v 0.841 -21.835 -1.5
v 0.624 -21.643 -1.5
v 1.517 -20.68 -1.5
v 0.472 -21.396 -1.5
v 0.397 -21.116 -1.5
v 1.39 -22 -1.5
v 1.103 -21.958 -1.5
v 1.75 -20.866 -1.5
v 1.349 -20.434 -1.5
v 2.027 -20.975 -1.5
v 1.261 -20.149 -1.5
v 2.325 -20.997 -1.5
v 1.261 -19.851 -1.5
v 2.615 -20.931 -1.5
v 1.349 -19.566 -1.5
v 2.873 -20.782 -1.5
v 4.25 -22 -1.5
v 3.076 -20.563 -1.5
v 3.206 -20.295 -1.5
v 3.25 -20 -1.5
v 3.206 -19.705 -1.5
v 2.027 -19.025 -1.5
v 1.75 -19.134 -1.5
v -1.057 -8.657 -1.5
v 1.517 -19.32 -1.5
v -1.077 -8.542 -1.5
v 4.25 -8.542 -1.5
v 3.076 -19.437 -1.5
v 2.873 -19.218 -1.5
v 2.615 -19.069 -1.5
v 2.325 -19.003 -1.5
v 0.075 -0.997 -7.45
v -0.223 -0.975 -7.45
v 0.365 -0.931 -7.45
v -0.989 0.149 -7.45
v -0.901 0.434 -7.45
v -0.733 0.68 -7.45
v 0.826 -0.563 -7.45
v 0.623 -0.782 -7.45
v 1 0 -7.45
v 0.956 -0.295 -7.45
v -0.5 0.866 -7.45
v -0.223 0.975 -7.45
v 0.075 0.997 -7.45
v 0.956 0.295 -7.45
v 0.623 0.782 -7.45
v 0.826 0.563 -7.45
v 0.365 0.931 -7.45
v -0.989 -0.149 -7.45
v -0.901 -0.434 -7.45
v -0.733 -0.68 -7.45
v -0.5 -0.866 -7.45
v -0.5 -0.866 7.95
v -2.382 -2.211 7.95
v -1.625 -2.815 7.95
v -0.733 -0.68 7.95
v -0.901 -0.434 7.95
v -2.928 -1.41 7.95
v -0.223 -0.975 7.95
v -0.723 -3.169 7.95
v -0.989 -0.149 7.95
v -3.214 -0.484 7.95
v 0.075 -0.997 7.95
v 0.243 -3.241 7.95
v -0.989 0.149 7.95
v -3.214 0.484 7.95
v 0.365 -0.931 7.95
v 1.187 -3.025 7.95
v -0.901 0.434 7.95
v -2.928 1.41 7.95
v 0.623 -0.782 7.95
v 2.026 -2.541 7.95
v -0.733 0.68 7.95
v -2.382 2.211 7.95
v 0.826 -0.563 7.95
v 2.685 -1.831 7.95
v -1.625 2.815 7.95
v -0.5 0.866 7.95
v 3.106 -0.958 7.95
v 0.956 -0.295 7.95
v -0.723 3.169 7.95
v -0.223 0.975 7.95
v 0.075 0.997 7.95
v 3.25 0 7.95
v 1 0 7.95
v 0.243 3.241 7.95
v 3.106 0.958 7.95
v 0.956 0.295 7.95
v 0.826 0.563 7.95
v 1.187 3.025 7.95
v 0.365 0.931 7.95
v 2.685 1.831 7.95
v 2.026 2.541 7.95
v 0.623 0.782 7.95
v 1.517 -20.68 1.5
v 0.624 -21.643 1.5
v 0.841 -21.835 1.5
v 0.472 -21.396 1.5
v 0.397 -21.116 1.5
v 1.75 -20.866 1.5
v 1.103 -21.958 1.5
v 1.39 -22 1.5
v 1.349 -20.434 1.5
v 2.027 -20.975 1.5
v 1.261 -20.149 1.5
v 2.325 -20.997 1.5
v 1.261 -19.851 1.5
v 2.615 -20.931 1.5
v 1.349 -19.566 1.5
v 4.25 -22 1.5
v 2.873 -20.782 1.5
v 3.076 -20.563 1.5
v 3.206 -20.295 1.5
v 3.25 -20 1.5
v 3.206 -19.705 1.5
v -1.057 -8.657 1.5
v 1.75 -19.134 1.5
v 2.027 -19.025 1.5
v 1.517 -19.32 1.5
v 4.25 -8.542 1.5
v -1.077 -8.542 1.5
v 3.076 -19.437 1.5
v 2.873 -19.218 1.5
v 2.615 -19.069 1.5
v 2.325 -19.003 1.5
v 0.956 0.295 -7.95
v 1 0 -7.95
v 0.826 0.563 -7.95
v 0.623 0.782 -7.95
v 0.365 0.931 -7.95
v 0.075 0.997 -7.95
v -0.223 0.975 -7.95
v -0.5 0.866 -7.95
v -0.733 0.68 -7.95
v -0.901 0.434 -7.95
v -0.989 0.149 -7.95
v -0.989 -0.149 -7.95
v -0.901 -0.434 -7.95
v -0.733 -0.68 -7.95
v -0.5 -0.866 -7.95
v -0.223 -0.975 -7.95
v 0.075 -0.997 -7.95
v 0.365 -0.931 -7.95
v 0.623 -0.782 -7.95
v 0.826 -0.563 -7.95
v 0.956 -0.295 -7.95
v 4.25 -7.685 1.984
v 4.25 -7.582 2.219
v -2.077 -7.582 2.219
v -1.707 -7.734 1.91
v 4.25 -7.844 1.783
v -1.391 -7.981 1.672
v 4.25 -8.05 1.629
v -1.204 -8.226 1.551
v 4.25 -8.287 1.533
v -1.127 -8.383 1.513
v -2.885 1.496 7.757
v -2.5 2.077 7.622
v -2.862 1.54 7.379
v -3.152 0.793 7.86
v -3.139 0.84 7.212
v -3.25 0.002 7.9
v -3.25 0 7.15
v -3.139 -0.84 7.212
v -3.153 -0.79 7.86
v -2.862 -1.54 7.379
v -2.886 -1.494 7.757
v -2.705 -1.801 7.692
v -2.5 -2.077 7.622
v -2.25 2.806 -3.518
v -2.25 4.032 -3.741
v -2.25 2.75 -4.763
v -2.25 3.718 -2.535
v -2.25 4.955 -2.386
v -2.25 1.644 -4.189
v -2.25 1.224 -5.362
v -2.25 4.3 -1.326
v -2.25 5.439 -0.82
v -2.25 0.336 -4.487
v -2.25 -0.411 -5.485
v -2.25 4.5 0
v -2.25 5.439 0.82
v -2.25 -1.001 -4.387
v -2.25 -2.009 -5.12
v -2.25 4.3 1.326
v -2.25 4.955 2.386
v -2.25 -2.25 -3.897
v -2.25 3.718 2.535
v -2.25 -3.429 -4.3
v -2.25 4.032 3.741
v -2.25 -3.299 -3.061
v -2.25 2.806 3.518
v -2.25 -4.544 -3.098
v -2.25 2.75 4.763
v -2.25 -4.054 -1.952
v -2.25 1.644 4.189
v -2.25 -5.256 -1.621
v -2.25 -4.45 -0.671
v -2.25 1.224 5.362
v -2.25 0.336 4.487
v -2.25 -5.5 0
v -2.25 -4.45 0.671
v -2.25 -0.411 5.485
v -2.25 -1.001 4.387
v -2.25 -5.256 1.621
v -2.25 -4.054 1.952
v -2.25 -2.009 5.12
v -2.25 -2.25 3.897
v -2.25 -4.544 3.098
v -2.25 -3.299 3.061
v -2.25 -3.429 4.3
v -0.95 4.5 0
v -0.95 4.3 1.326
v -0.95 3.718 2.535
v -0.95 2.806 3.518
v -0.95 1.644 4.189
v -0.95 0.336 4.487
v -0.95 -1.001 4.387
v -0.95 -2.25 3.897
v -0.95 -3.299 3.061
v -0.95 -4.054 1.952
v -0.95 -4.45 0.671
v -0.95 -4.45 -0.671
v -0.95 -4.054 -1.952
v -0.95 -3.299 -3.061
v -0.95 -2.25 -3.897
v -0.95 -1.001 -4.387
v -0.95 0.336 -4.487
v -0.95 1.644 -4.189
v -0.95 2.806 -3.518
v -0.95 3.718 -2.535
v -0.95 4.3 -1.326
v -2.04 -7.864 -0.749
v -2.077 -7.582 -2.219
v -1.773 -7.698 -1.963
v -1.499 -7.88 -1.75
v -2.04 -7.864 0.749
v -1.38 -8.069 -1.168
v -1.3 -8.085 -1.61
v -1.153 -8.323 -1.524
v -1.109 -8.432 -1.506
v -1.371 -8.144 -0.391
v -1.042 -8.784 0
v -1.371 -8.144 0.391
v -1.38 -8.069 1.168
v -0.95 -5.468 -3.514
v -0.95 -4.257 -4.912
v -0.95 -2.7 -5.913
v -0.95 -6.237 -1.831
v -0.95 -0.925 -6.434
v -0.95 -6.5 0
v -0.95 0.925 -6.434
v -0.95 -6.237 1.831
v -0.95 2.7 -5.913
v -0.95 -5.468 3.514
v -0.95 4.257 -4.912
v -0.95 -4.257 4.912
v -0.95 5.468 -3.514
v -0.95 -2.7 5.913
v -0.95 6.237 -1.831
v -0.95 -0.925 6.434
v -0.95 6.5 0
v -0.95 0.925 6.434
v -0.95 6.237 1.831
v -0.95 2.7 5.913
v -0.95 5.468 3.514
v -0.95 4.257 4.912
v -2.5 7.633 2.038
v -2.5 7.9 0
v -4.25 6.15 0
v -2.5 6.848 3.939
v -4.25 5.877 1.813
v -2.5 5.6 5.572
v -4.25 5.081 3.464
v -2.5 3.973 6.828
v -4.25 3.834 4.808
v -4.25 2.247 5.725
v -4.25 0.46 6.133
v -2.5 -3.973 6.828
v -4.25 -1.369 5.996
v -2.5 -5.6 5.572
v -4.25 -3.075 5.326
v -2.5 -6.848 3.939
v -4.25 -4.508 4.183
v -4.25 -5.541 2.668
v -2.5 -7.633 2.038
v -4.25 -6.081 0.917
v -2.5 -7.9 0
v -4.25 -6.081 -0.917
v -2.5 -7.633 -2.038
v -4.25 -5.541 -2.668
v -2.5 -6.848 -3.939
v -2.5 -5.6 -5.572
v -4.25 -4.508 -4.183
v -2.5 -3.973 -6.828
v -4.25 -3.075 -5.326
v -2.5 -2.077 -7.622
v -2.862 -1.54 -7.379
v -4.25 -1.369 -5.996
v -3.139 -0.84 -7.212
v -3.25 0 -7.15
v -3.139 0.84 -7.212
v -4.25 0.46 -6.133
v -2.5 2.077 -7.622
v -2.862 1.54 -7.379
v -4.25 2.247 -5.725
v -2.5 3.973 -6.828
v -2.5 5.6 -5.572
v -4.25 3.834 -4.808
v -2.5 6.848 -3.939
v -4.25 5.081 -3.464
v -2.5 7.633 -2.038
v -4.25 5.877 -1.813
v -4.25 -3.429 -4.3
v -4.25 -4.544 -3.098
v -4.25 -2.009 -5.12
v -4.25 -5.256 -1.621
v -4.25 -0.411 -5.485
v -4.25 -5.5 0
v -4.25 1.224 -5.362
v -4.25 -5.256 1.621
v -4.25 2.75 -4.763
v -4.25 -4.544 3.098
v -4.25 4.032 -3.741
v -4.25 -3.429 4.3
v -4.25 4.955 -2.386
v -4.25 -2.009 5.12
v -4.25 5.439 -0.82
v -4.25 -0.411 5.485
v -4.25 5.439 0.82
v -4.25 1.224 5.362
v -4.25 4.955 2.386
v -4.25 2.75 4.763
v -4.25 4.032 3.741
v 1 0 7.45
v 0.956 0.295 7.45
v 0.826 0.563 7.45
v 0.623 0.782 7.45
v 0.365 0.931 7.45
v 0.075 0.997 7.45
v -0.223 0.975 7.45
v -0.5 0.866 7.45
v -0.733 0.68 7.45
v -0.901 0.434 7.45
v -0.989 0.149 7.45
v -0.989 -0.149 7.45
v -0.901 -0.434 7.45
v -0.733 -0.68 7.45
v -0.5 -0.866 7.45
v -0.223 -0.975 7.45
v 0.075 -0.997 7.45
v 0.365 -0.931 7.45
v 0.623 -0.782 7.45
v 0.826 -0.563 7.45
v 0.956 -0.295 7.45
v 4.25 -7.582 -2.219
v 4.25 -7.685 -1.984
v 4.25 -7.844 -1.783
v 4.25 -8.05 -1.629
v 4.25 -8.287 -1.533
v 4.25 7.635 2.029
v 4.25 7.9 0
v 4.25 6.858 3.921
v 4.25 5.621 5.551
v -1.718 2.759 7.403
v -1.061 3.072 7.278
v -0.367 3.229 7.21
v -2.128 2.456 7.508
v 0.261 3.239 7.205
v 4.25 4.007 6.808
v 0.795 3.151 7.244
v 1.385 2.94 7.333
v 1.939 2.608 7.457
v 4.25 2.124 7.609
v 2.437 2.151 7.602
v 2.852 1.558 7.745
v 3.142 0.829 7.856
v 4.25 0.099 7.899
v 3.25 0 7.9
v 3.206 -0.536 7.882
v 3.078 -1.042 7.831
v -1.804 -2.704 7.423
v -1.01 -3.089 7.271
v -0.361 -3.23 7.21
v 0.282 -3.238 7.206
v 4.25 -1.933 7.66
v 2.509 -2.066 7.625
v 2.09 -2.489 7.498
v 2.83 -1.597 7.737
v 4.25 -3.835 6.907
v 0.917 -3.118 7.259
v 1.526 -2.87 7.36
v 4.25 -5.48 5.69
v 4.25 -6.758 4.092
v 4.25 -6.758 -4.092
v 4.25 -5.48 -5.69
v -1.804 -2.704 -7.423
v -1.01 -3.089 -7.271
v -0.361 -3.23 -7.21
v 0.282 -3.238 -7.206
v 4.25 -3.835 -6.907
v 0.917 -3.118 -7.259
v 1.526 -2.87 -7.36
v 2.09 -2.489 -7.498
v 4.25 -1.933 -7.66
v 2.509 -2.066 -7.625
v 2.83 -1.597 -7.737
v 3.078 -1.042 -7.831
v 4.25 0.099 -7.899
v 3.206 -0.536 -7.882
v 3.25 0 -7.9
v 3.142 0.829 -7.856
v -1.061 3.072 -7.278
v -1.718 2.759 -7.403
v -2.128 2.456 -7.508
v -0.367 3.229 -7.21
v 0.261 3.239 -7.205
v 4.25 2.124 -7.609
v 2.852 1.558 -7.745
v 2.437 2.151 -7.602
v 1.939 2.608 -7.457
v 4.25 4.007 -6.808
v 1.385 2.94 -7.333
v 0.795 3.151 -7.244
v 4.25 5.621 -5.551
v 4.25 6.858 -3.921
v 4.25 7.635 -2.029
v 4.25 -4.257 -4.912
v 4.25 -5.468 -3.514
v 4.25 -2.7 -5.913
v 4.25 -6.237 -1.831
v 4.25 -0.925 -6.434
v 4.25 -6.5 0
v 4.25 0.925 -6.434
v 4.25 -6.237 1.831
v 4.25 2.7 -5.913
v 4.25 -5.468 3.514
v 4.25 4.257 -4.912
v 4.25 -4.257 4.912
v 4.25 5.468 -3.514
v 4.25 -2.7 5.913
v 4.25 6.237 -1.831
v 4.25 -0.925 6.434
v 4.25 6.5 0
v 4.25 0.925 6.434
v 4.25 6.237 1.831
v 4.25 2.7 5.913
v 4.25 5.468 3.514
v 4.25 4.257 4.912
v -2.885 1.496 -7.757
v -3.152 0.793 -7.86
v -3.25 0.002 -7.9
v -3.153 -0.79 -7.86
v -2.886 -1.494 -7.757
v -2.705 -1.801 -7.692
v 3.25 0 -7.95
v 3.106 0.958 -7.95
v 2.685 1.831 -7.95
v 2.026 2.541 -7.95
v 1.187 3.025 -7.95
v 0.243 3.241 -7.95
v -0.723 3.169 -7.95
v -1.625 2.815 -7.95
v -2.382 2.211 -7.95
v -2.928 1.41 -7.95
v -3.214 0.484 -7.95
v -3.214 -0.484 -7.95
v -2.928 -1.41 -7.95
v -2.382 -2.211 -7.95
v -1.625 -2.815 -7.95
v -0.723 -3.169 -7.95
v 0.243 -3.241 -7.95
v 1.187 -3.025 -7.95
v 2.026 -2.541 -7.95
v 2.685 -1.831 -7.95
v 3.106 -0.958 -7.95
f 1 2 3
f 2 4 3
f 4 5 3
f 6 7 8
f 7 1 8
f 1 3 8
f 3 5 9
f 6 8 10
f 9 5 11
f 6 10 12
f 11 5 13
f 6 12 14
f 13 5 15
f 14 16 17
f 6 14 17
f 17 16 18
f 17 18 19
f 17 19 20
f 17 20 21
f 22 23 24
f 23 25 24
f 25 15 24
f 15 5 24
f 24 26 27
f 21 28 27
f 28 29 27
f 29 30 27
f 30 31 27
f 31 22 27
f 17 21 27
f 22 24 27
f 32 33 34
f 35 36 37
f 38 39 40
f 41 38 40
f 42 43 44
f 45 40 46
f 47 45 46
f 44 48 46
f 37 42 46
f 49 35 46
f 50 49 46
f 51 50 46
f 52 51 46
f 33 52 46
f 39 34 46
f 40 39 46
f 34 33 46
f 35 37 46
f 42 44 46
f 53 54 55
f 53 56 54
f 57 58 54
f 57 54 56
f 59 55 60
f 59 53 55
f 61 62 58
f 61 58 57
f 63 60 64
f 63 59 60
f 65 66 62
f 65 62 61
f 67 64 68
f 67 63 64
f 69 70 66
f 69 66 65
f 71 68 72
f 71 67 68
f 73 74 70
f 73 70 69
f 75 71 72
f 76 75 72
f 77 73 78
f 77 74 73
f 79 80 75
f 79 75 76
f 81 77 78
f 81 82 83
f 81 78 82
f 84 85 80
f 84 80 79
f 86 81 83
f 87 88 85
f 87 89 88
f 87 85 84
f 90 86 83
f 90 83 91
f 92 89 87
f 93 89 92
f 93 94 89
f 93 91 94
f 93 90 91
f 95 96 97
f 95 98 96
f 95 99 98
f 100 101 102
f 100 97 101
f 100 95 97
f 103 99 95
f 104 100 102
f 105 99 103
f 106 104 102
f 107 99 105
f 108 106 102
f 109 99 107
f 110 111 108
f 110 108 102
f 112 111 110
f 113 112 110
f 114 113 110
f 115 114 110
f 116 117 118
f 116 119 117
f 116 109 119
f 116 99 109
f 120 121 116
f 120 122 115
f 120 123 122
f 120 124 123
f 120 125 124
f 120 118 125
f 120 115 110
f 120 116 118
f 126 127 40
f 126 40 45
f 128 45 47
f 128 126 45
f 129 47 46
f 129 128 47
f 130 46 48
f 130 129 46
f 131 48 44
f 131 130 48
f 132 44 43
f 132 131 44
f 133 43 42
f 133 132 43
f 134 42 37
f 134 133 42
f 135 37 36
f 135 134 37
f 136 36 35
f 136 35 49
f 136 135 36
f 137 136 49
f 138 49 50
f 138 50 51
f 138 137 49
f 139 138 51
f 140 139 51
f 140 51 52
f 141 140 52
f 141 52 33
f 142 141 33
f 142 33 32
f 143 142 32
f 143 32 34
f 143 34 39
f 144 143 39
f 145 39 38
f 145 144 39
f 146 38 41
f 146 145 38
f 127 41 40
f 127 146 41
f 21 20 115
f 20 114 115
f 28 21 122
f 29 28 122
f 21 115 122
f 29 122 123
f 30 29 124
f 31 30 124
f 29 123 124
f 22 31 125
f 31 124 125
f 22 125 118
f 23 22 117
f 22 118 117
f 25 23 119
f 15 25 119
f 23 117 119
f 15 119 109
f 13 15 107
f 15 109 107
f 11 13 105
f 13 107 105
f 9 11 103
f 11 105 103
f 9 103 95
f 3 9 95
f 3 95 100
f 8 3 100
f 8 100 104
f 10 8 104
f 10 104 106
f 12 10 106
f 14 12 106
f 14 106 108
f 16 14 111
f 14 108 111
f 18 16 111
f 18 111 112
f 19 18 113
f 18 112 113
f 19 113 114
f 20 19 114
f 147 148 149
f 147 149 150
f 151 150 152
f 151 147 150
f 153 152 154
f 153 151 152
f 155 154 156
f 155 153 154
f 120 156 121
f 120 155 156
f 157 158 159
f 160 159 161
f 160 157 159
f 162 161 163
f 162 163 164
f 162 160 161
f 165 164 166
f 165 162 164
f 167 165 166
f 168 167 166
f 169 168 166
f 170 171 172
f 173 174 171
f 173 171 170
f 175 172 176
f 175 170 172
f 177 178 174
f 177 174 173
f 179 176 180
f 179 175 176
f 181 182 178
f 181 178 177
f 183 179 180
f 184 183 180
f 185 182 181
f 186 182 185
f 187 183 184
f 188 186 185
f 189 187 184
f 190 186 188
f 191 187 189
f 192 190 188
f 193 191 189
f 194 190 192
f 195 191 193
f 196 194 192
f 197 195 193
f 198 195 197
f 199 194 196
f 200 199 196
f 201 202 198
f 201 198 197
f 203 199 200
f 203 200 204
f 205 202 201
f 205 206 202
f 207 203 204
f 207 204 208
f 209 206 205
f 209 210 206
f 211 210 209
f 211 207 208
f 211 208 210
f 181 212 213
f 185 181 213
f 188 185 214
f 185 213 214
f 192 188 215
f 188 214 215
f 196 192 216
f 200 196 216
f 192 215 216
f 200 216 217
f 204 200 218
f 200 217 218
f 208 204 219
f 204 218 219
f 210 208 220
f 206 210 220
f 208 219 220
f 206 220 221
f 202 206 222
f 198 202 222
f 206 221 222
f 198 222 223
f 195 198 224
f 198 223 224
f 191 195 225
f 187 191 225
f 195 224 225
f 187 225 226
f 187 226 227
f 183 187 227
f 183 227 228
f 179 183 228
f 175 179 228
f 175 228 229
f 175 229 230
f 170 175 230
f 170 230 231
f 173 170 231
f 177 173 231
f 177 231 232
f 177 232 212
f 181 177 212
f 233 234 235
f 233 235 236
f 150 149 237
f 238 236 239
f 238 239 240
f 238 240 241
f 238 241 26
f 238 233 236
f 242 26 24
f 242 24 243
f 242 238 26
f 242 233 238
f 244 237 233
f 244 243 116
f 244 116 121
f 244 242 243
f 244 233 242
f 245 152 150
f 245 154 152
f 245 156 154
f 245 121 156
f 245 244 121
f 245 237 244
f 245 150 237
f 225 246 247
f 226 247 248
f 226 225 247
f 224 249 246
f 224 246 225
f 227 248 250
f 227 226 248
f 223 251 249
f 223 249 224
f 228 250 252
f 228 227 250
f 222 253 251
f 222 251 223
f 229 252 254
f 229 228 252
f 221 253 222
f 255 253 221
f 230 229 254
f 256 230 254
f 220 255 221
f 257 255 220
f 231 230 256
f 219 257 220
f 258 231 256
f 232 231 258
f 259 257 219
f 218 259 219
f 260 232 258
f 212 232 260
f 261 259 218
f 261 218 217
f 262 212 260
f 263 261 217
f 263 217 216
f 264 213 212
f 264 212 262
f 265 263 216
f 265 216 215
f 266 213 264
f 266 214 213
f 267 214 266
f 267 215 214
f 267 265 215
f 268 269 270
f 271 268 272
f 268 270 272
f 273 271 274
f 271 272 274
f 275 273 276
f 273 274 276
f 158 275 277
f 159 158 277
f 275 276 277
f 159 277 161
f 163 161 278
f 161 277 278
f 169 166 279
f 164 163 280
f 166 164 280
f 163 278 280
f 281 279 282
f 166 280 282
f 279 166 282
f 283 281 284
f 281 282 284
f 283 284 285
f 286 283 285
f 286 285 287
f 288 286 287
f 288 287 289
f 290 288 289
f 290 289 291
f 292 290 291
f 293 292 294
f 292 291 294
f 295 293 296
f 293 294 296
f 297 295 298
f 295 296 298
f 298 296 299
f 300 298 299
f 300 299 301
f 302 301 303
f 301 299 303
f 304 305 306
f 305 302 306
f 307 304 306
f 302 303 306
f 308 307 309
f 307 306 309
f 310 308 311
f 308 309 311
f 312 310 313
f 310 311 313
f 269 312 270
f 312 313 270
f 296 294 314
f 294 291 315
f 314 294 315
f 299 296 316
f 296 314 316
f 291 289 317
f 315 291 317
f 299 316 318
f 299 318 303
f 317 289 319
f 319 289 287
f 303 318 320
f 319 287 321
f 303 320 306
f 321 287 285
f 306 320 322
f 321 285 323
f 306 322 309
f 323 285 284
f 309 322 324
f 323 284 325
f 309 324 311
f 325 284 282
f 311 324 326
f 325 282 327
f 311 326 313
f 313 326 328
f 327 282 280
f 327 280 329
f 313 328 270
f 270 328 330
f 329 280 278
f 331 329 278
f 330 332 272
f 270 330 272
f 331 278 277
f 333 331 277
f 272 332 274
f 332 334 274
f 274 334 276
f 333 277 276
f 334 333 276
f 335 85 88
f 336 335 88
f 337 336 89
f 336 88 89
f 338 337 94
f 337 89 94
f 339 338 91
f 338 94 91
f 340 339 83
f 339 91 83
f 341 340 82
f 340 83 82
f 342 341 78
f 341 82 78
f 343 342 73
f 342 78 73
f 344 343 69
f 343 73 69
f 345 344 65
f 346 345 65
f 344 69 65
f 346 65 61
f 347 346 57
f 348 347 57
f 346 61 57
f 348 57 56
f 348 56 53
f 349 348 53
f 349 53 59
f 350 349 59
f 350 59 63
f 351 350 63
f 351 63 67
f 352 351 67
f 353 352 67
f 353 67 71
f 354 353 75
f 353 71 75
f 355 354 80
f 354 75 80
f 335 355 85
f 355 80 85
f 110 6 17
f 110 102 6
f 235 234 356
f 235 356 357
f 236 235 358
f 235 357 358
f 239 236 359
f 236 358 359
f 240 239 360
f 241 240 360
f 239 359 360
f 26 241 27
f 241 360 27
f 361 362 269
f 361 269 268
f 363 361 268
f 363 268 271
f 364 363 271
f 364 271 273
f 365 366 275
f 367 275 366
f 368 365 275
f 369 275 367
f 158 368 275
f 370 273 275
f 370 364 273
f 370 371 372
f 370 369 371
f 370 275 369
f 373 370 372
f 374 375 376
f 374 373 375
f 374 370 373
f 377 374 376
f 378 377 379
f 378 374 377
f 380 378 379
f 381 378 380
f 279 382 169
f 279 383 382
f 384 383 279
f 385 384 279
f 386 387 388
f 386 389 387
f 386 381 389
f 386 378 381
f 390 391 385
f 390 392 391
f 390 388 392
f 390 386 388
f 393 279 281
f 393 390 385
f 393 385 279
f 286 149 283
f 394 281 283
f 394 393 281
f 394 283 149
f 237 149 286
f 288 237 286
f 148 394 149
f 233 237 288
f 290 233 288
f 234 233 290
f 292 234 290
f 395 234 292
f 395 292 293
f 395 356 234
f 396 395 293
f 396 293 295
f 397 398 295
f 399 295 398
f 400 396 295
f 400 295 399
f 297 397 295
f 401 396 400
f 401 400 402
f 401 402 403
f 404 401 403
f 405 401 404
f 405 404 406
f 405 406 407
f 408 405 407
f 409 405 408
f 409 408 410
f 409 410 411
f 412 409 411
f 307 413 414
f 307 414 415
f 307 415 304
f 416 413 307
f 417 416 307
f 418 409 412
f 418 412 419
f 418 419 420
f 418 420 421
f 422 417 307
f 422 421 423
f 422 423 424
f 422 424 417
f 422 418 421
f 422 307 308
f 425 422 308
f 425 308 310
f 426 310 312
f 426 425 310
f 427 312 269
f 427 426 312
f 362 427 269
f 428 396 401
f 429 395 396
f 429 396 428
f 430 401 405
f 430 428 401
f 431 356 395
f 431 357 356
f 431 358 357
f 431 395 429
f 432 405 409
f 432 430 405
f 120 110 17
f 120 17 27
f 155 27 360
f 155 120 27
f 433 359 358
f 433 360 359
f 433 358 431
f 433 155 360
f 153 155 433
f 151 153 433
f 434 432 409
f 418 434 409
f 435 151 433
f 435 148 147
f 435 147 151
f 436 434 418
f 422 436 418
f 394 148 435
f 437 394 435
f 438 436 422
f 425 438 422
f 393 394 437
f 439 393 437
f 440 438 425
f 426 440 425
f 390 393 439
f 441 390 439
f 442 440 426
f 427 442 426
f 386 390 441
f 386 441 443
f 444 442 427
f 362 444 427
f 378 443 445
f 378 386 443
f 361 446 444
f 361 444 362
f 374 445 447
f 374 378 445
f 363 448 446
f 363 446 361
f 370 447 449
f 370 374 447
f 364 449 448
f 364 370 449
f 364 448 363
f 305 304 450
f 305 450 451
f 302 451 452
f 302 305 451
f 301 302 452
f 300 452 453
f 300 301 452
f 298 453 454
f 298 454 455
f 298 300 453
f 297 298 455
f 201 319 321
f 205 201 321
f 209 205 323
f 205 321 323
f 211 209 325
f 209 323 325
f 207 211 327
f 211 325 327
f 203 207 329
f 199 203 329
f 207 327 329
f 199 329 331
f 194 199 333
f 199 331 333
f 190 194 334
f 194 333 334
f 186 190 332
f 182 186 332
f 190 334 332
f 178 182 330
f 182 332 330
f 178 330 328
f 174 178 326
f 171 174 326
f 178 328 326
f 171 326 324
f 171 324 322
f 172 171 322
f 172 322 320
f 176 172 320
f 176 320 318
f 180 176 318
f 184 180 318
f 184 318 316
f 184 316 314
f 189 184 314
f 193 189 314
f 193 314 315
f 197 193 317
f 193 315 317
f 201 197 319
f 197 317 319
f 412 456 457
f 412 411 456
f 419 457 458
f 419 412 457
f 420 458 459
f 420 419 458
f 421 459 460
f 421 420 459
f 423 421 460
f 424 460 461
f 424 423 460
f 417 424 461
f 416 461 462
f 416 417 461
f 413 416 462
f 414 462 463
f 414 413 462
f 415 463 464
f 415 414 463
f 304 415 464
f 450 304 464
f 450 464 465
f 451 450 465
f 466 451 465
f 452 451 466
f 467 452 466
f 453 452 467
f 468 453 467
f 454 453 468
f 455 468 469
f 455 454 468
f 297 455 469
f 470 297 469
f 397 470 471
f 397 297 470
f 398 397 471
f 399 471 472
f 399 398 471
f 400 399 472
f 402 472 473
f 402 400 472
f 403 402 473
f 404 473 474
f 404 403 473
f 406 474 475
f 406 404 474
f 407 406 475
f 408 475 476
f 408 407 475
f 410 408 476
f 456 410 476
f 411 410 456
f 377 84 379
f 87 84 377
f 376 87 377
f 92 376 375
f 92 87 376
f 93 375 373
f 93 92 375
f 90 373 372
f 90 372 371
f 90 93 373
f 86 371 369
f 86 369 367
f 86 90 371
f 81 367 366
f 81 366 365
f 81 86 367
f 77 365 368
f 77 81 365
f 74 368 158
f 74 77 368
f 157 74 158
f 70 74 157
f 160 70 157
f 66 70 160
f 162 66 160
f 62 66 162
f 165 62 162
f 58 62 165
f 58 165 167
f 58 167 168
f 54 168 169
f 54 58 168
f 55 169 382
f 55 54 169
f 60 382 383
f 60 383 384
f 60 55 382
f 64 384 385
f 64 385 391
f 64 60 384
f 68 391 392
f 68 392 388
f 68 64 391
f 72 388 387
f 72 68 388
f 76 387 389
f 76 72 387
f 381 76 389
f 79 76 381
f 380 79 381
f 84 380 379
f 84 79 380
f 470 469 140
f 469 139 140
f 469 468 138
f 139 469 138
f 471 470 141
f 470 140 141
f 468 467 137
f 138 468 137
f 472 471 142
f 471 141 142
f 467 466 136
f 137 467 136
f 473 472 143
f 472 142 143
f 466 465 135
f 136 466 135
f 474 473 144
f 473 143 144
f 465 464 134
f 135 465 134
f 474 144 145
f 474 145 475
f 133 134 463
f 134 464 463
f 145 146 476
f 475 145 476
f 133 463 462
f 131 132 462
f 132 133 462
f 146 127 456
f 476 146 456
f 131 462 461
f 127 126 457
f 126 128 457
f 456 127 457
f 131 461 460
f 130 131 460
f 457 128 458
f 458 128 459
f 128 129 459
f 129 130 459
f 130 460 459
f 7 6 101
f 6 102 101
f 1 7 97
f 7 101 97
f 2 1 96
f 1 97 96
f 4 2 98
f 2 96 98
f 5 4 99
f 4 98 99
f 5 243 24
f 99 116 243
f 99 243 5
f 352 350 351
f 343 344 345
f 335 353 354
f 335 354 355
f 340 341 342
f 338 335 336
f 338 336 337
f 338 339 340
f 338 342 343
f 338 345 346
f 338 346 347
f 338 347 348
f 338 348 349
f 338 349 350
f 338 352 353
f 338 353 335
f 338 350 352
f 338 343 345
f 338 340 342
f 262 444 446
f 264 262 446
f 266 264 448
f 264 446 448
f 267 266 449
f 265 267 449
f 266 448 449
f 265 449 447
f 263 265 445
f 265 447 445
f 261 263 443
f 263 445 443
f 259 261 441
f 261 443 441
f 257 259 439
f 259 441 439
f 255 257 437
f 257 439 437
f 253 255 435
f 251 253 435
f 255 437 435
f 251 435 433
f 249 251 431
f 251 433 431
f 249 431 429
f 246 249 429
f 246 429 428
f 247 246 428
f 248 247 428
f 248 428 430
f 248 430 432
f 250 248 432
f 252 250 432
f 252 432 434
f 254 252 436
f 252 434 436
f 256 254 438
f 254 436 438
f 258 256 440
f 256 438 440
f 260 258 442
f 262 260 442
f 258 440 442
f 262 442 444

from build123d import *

# Parameters (mm, degrees)
F0_R         = 7.9
F1_DEPTH     = 4.25
F2_R         = 3.25
F3_DEPTH     = 7.95
F4_R         = 6.5
F5_DEPTH     = 5.2
F6_R         = 5.5
F7_DEPTH     = 2
F8_R         = 4.5
F9_DEPTH     = 8.5010001
F10_S5_R     = 3.25
F10_T6_DEPTH = 13
F12_DEPTH    = 1.5
F13_R        = 1
F14_R        = 1
F15_DEPTH    = 0.5
F16_R        = 1
F17_DEPTH    = 4
F18_R        = 1


# Not quite as in the source:
# - a fillet or chamfer that OpenCascade refuses, or shapes differently, is made with other operations: its cross-section is extruded or revolved along the edge and cut away or added
# - a pattern or mirror of a feature is missing from the dataset's text; its kind, count and spacing are read off the source's solid


with BuildPart() as f1:
    # F0 (on Right) → F1 (new body, symmetric)
    with BuildSketch(Plane.YZ):
        Circle(F0_R)
    extrude(amount=F1_DEPTH, both=True)

    # F2 (on Top) → F3 (join, symmetric)
    with BuildSketch(Plane.XY):
        Circle(F2_R)
    extrude(amount=F3_DEPTH, both=True)

    # F4 (on face) → F5 (cut)
    with BuildSketch(Plane.YZ.offset(4.25)):
        Circle(F4_R)
    extrude(amount=-F5_DEPTH, mode=Mode.SUBTRACT)

    # F6 (on face) → F7 (cut)
    with BuildSketch(Plane(origin=(-4.25, 0, 0), x_dir=(0, -1, 0), z_dir=(-1, 0, 0))):
        Circle(F6_R)
    extrude(amount=-F7_DEPTH, mode=Mode.SUBTRACT)

    # F8 (on face) → F9 (cut, through all)
    with BuildSketch(Plane.YZ.offset(4.25)):
        Circle(F8_R)
    extrude(amount=-F9_DEPTH, mode=Mode.SUBTRACT)

    # F10: chamfer of 1.75 on 1 edges, made by hand


with BuildPart() as f10_tool2:
    # F10_s3 → F10_t4 (revolve)
    with BuildSketch(Plane.XY):
        Polygon((-2.5, 7.9), (-4.25, 6.15), (-4.25, 7.9), align=None)
    revolve(axis=Axis((-4.25, 0, 0), (1, 0, 0)))

    # F10_s5 → F10_t6 (cut, symmetric)
    with BuildSketch(Plane.XY):
        Circle(F10_S5_R)
    extrude(amount=F10_T6_DEPTH, both=True, mode=Mode.SUBTRACT)


with BuildPart() as f1_1:
    add(f1.part)

    # F10_t1: cut F10_tool2
    add(f10_tool2.part, mode=Mode.SUBTRACT)

    # F11 (on Top) → F12 (join, symmetric)
    with BuildSketch(Plane.XY):
        Polygon((-1.25, -7), (0.5, -22), (4.25, -22), (4.25, -7), align=None)
    extrude(amount=F12_DEPTH, both=True)

    # F13
    f13_edges = [f1_1.edges().sort_by_distance(p)[0] for p in [
        (-1.145, -7.9, 0),
        (1.544117, -7.756288, 1.5),
        (1.544117, -7.756288, -1.5),
    ]]
    fillet(f13_edges, radius=F13_R)

    # F14 (on face) → F15 (cut)
    with BuildSketch(Plane.XY.offset(7.95)):
        Circle(F14_R)
    f15 = extrude(amount=-F15_DEPTH, mode=Mode.SUBTRACT)

    # F15_copies: F15 across plane
    add(f15.mirror(Plane(origin=(0, 0, 0), x_dir=(-1, 0, 0), z_dir=(0, 0, -1))), mode=Mode.SUBTRACT)

    # F16 (on Top) → F17 (cut, symmetric)
    with BuildSketch(Plane.XY):
        with Locations((2.25, -20)):
            Circle(F16_R)
    extrude(amount=F17_DEPTH, both=True, mode=Mode.SUBTRACT)

    # F18
    f18_edges = [f1_1.edges().sort_by_distance(p)[0] for p in [
        (0.5, -22, 0),
    ]]
    fillet(f18_edges, radius=F18_R)


solid = f1_1.part
